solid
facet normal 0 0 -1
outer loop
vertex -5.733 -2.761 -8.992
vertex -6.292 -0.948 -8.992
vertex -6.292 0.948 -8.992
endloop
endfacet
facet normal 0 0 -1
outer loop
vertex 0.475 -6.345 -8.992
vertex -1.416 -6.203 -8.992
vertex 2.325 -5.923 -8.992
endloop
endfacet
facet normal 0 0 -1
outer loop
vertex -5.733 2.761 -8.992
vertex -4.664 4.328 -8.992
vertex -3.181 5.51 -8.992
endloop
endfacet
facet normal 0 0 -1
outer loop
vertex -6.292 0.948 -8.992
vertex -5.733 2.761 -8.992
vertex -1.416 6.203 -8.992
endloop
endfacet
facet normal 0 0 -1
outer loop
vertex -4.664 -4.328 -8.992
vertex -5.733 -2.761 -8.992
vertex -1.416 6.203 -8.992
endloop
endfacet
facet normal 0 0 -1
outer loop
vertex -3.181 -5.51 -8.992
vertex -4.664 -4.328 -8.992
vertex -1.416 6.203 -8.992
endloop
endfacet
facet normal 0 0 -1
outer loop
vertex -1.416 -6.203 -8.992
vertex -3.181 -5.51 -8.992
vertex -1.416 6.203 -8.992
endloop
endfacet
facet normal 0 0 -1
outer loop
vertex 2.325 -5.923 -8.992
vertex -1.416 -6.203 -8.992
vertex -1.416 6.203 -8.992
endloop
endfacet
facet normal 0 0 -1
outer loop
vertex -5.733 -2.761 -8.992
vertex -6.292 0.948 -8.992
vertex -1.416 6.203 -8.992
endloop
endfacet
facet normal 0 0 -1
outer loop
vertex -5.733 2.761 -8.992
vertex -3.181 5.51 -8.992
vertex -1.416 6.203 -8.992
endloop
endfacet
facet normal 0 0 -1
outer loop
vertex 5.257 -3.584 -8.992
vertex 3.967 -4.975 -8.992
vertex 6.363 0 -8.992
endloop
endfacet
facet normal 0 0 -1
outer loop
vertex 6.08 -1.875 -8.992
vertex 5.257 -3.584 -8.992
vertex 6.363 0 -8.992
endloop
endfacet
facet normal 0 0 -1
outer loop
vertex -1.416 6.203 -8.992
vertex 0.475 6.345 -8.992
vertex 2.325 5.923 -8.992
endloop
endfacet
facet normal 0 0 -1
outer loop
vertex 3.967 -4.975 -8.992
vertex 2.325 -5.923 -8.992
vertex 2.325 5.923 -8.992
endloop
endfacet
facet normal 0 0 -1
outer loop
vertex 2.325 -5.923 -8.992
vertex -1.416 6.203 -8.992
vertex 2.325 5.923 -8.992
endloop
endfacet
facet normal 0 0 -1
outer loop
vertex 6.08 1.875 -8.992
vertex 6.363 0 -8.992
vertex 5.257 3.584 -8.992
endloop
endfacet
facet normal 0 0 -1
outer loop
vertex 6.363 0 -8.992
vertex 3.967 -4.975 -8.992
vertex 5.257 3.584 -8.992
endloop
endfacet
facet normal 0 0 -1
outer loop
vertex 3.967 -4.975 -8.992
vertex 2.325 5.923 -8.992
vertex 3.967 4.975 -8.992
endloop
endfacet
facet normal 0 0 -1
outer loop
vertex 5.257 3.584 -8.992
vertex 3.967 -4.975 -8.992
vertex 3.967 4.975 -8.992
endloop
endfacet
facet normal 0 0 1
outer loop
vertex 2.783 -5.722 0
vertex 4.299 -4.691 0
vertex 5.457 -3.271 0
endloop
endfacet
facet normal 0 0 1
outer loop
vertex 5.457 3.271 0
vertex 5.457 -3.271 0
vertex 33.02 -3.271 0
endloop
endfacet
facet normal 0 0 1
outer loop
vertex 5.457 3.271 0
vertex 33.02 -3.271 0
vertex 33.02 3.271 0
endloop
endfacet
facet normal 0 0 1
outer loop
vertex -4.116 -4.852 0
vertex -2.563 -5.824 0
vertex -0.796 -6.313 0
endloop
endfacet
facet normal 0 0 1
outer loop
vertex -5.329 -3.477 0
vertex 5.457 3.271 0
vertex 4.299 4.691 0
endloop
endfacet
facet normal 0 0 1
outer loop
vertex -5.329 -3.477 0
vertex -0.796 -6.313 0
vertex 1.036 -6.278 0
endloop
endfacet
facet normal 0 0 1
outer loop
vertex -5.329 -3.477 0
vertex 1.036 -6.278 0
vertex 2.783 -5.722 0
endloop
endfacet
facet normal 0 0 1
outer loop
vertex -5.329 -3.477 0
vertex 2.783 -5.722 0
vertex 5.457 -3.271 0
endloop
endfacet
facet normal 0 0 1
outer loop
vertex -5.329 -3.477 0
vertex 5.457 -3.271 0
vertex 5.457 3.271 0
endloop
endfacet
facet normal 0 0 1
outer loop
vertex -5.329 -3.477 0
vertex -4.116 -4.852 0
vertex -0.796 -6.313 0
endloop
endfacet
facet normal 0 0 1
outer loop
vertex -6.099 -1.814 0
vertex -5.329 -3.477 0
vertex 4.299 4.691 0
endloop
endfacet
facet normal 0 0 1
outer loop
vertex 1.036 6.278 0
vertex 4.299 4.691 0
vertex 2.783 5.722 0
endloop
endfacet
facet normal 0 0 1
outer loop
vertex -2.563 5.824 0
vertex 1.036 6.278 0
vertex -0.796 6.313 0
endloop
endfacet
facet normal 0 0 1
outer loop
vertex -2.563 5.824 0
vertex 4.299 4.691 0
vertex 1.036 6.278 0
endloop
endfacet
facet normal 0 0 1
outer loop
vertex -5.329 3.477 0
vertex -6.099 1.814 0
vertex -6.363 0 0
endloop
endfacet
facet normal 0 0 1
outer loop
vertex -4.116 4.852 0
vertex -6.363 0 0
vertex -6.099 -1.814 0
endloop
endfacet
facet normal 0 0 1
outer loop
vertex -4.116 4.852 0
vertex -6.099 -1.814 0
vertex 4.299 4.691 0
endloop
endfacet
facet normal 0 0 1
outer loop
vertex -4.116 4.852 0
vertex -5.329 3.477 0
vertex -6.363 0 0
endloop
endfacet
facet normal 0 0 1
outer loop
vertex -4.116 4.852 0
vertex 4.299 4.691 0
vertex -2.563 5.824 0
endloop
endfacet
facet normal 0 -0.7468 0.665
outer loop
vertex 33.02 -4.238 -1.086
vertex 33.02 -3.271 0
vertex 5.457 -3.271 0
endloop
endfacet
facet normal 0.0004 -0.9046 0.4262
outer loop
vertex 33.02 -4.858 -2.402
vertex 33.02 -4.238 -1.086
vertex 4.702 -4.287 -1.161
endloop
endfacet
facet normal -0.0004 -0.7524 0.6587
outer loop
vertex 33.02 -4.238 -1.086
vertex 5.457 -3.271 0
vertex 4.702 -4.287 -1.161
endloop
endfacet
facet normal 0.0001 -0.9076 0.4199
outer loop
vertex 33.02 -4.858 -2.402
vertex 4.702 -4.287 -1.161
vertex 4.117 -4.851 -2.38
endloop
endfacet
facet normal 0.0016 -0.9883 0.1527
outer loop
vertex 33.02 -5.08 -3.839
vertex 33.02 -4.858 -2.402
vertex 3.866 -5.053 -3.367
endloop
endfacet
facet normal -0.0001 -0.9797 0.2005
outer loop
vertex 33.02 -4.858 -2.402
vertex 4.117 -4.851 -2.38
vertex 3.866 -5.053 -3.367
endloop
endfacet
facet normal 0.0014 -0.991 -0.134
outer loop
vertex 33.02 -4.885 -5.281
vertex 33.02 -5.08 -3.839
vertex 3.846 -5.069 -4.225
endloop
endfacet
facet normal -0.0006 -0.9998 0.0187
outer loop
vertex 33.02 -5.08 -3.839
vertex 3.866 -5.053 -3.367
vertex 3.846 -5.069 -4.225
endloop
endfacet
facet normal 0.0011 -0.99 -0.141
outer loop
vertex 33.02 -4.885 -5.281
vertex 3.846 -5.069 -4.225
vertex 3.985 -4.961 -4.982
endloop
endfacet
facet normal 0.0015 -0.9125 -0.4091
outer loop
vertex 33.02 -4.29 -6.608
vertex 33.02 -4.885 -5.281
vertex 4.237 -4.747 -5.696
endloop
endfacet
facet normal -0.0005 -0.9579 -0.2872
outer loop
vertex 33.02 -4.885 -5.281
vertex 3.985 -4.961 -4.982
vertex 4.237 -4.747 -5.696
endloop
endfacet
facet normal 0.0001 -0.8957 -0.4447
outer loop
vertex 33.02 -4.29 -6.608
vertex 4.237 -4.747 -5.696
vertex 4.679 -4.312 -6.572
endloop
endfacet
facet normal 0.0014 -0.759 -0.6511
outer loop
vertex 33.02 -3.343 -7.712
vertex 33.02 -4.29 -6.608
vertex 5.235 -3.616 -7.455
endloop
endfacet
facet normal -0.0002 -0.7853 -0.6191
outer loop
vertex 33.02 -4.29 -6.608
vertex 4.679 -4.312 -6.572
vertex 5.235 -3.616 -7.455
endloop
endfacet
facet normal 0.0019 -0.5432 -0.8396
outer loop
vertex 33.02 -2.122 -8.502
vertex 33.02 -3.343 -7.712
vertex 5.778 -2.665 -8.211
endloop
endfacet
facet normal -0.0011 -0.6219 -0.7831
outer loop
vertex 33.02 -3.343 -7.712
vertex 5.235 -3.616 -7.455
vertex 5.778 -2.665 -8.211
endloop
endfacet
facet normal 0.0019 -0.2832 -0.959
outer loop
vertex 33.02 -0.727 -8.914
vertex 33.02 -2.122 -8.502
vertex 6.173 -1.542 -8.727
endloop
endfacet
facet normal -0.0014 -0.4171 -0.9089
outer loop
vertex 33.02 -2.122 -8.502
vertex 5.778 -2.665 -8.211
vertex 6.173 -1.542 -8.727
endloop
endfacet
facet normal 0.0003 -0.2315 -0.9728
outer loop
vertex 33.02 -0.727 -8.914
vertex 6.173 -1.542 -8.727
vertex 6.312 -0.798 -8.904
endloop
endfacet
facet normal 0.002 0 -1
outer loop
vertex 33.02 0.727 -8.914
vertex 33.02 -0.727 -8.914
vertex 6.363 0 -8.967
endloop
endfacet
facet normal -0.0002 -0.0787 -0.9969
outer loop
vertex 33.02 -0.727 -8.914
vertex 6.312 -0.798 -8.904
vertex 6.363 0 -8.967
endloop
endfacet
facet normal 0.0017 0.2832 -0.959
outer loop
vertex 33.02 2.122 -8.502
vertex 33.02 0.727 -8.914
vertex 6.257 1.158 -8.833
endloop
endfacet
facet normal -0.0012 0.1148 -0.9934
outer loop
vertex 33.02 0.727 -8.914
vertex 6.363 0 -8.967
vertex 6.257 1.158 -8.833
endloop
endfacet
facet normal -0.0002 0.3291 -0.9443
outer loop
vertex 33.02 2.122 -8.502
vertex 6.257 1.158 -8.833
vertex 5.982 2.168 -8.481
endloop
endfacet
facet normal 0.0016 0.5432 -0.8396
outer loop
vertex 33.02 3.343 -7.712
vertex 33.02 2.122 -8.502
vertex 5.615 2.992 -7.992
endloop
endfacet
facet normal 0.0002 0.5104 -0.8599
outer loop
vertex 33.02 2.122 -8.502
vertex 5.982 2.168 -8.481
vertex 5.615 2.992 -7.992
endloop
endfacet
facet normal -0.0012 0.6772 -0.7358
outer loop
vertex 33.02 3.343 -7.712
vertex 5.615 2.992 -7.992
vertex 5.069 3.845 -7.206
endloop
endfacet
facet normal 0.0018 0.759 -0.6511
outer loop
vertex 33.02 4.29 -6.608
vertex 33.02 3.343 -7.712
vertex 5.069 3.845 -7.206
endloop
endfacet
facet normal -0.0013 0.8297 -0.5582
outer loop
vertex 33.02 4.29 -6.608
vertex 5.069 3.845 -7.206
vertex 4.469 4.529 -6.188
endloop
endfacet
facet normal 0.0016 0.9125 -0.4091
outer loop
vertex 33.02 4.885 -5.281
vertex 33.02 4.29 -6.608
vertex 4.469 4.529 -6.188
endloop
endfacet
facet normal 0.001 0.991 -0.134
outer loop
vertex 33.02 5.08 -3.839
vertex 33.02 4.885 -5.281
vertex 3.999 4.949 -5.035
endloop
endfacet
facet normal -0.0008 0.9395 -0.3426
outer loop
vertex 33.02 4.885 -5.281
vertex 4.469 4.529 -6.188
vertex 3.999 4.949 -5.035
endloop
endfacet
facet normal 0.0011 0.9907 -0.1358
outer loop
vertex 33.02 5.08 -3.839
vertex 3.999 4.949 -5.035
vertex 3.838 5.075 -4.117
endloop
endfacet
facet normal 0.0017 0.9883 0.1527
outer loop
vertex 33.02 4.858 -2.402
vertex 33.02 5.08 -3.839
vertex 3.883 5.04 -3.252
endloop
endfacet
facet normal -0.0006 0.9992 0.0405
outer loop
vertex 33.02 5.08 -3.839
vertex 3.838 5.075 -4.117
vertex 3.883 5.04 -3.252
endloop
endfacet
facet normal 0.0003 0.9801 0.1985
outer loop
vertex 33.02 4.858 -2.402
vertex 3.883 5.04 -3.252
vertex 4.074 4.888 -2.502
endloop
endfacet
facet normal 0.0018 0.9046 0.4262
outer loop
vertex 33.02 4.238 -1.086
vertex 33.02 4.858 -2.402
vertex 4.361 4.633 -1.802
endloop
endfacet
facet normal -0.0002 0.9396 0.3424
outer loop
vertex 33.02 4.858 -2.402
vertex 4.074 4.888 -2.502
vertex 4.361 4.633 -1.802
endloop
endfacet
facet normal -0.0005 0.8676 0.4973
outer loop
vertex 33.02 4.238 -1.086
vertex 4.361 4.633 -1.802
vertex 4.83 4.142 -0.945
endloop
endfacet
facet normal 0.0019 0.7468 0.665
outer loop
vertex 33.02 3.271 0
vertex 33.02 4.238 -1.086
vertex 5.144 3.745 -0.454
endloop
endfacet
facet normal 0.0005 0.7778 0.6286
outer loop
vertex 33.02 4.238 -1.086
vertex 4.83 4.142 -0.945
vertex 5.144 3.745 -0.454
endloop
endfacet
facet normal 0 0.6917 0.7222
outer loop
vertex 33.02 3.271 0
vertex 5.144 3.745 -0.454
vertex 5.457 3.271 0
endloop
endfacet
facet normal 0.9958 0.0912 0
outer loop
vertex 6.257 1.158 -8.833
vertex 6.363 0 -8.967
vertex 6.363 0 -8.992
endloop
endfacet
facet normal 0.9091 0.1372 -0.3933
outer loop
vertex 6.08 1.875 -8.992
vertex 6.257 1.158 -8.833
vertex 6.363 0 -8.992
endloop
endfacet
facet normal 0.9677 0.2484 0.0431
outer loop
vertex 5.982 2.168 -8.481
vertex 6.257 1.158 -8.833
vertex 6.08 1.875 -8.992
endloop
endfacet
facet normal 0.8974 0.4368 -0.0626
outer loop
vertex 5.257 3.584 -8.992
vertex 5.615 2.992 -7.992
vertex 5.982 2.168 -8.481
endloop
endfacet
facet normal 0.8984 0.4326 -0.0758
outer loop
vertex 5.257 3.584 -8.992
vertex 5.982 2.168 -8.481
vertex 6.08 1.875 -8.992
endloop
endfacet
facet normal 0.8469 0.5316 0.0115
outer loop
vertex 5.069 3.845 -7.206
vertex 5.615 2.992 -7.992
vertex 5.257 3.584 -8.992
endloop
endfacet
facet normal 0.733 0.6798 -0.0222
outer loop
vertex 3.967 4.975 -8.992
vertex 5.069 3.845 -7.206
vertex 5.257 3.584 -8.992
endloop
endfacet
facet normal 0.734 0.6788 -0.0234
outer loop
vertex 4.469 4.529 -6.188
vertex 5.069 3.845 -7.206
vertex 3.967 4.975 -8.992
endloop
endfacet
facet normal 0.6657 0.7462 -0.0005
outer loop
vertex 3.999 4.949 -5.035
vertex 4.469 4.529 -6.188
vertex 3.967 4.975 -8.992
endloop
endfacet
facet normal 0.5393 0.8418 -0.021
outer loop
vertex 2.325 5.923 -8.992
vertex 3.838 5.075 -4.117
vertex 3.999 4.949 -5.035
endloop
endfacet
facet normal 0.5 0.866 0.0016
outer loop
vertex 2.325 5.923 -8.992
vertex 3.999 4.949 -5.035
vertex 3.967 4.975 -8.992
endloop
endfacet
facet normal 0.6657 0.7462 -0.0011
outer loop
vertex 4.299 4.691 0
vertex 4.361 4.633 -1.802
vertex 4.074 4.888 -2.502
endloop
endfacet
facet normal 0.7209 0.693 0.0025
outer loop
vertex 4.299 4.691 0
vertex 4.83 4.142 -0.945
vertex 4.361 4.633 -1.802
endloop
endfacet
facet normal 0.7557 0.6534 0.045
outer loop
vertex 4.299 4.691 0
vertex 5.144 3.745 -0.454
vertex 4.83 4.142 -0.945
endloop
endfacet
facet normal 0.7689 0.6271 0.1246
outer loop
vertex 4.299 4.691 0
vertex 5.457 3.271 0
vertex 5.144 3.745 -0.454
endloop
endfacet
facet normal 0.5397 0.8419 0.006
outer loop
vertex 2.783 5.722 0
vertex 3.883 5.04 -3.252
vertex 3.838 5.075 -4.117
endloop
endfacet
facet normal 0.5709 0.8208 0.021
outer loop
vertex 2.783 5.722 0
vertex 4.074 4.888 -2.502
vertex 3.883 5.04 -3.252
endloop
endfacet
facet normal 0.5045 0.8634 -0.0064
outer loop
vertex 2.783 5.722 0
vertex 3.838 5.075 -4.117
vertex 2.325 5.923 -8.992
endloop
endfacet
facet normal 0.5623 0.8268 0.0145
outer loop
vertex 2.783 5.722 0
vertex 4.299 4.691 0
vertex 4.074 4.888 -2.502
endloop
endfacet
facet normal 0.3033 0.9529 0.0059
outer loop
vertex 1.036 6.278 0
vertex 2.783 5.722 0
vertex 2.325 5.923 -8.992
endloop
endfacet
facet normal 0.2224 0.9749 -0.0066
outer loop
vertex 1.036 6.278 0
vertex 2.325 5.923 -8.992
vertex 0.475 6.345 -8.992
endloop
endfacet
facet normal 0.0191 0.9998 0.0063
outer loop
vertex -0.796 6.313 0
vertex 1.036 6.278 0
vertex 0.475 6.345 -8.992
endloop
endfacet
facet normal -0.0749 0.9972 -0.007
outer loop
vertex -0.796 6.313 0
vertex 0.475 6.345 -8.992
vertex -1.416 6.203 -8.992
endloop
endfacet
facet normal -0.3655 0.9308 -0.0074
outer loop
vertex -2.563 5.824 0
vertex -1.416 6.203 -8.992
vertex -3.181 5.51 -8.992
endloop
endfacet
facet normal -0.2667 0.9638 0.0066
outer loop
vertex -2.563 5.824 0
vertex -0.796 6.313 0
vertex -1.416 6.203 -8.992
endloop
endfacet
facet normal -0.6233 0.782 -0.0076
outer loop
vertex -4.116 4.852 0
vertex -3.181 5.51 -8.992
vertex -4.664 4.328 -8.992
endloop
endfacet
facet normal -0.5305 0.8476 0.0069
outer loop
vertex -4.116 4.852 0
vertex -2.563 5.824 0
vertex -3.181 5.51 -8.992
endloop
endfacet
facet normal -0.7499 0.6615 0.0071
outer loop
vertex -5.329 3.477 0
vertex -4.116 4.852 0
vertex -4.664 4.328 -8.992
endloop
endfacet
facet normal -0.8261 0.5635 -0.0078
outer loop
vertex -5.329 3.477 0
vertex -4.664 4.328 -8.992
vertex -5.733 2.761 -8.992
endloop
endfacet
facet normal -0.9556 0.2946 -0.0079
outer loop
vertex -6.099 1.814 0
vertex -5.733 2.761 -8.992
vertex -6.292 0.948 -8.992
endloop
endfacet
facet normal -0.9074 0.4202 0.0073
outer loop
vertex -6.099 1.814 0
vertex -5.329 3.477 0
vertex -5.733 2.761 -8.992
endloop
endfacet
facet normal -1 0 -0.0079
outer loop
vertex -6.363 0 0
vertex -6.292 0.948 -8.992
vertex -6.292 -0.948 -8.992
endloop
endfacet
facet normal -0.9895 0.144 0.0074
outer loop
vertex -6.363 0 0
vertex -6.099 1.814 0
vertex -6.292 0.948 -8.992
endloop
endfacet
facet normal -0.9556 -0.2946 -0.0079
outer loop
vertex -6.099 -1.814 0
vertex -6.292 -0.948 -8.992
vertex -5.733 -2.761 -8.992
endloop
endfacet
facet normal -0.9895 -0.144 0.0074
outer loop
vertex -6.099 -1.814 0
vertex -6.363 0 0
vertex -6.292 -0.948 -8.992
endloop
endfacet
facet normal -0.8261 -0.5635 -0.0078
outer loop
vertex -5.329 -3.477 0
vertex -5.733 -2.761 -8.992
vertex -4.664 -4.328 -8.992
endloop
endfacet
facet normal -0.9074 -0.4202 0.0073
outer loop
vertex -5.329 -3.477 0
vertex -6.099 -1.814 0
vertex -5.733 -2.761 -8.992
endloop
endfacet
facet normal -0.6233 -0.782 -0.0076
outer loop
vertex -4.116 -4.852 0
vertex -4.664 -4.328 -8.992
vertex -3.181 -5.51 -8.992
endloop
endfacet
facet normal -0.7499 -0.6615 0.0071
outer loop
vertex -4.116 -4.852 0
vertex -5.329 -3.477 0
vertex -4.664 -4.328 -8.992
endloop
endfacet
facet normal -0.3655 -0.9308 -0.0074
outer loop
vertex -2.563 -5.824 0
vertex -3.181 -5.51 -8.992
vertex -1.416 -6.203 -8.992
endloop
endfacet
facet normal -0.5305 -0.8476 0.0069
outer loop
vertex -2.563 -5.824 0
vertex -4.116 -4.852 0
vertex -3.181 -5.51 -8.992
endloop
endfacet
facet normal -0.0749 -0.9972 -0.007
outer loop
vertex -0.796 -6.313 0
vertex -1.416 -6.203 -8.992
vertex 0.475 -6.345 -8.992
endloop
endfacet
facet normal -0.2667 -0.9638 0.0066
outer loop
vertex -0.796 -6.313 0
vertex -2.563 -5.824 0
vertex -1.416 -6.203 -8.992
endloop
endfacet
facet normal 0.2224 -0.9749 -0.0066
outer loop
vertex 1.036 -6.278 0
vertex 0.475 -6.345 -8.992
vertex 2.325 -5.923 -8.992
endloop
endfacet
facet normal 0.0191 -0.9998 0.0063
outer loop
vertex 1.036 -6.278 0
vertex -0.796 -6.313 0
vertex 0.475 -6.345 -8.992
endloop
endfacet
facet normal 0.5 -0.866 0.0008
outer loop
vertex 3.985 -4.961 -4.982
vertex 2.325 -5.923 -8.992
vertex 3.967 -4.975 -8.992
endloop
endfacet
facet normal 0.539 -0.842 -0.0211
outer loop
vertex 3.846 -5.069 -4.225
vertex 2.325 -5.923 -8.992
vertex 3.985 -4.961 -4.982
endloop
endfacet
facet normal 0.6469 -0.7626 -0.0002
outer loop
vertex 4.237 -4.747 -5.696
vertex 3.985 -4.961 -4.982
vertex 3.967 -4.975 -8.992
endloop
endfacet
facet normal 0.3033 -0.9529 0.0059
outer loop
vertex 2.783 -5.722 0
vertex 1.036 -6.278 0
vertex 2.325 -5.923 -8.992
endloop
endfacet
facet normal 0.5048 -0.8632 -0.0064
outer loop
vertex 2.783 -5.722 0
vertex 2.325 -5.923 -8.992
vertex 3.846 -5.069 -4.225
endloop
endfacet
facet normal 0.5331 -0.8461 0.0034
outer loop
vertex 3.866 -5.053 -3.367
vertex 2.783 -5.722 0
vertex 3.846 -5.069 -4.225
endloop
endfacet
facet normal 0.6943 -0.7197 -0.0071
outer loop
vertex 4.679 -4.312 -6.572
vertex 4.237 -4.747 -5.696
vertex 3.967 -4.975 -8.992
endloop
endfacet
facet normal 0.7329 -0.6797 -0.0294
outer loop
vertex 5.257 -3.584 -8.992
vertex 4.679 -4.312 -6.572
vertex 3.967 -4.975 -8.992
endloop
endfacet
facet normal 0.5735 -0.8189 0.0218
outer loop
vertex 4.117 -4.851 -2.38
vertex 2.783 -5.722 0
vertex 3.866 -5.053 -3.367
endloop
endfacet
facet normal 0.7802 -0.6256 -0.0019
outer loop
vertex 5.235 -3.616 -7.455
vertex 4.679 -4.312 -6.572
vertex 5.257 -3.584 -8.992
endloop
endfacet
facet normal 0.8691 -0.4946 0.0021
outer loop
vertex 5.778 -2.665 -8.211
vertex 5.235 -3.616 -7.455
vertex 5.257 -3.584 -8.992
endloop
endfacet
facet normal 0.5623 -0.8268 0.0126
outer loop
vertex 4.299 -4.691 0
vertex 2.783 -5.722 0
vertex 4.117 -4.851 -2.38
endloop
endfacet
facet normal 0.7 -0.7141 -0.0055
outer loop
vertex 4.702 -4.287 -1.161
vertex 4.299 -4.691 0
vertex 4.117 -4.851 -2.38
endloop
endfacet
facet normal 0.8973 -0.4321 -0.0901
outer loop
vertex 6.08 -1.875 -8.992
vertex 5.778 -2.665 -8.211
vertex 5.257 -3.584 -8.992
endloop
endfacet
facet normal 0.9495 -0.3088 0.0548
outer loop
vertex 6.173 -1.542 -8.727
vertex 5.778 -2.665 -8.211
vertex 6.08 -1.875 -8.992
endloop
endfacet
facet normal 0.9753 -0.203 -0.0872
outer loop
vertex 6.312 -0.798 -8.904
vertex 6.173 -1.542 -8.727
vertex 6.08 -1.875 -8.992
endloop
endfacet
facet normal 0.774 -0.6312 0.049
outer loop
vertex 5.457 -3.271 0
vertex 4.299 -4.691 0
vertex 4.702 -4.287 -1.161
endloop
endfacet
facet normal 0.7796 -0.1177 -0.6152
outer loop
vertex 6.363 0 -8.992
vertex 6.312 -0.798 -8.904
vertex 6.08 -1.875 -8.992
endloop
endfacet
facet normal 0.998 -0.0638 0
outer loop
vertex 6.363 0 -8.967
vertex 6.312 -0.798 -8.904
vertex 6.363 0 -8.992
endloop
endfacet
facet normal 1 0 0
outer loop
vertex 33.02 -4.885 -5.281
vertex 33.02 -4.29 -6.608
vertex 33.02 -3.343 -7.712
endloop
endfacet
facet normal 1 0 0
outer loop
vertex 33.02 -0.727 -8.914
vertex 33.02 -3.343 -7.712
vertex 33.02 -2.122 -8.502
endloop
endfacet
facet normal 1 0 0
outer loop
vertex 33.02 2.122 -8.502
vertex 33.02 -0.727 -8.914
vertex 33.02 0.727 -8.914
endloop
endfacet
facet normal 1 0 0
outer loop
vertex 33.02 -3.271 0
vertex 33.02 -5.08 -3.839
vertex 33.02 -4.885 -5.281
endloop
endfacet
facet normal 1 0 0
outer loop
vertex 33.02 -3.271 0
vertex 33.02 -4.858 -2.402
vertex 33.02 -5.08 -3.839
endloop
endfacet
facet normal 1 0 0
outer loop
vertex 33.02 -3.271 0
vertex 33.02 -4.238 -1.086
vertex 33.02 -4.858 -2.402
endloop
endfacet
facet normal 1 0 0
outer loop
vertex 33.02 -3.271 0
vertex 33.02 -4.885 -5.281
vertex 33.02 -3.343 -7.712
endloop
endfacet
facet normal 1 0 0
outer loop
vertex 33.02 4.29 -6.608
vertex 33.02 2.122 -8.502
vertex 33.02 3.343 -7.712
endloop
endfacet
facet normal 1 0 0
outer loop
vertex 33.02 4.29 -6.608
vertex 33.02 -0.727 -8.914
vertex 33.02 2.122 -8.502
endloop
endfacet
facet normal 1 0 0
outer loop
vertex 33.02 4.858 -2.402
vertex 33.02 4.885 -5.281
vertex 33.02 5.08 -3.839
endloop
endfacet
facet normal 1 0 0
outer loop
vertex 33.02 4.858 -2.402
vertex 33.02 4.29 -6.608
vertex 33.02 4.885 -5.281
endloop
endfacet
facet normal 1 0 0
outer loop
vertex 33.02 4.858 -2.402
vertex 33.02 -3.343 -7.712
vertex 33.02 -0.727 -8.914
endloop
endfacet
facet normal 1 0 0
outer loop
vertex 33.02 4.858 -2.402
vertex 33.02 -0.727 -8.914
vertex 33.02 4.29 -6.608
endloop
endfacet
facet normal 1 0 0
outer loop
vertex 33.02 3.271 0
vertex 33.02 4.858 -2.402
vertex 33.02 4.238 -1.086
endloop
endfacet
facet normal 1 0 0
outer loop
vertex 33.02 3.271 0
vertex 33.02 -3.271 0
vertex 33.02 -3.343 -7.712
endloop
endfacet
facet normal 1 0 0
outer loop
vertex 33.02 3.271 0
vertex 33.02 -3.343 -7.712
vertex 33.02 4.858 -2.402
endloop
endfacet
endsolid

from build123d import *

# Parameters (mm, degrees)
F0_R     = 6.3627
F1_DEPTH = 8.9916
F2_R     = 5.08
F3_DEPTH = 33.02
F4_DEPTH = 33.02


with BuildPart() as f1:
    # F0 (on Top) → F1 (new body)
    with BuildSketch(Plane.XY):
        Circle(F0_R)
    extrude(amount=-F1_DEPTH)

    # F2 (on Right) → F3 (join)
    with BuildSketch(Plane.YZ):
        with Locations((0, -3.8867404219)):
            Circle(F2_R)
    extrude(amount=F3_DEPTH)

    # F4 (cut, through all): a face of the model
    f4_faces = [f1.faces().sort_by_distance(p)[0] for p in [
        (0, 0, 0.4824606672),
    ]]
    extrude(f4_faces, amount=-F4_DEPTH, mode=Mode.SUBTRACT)


solid = f1.part
